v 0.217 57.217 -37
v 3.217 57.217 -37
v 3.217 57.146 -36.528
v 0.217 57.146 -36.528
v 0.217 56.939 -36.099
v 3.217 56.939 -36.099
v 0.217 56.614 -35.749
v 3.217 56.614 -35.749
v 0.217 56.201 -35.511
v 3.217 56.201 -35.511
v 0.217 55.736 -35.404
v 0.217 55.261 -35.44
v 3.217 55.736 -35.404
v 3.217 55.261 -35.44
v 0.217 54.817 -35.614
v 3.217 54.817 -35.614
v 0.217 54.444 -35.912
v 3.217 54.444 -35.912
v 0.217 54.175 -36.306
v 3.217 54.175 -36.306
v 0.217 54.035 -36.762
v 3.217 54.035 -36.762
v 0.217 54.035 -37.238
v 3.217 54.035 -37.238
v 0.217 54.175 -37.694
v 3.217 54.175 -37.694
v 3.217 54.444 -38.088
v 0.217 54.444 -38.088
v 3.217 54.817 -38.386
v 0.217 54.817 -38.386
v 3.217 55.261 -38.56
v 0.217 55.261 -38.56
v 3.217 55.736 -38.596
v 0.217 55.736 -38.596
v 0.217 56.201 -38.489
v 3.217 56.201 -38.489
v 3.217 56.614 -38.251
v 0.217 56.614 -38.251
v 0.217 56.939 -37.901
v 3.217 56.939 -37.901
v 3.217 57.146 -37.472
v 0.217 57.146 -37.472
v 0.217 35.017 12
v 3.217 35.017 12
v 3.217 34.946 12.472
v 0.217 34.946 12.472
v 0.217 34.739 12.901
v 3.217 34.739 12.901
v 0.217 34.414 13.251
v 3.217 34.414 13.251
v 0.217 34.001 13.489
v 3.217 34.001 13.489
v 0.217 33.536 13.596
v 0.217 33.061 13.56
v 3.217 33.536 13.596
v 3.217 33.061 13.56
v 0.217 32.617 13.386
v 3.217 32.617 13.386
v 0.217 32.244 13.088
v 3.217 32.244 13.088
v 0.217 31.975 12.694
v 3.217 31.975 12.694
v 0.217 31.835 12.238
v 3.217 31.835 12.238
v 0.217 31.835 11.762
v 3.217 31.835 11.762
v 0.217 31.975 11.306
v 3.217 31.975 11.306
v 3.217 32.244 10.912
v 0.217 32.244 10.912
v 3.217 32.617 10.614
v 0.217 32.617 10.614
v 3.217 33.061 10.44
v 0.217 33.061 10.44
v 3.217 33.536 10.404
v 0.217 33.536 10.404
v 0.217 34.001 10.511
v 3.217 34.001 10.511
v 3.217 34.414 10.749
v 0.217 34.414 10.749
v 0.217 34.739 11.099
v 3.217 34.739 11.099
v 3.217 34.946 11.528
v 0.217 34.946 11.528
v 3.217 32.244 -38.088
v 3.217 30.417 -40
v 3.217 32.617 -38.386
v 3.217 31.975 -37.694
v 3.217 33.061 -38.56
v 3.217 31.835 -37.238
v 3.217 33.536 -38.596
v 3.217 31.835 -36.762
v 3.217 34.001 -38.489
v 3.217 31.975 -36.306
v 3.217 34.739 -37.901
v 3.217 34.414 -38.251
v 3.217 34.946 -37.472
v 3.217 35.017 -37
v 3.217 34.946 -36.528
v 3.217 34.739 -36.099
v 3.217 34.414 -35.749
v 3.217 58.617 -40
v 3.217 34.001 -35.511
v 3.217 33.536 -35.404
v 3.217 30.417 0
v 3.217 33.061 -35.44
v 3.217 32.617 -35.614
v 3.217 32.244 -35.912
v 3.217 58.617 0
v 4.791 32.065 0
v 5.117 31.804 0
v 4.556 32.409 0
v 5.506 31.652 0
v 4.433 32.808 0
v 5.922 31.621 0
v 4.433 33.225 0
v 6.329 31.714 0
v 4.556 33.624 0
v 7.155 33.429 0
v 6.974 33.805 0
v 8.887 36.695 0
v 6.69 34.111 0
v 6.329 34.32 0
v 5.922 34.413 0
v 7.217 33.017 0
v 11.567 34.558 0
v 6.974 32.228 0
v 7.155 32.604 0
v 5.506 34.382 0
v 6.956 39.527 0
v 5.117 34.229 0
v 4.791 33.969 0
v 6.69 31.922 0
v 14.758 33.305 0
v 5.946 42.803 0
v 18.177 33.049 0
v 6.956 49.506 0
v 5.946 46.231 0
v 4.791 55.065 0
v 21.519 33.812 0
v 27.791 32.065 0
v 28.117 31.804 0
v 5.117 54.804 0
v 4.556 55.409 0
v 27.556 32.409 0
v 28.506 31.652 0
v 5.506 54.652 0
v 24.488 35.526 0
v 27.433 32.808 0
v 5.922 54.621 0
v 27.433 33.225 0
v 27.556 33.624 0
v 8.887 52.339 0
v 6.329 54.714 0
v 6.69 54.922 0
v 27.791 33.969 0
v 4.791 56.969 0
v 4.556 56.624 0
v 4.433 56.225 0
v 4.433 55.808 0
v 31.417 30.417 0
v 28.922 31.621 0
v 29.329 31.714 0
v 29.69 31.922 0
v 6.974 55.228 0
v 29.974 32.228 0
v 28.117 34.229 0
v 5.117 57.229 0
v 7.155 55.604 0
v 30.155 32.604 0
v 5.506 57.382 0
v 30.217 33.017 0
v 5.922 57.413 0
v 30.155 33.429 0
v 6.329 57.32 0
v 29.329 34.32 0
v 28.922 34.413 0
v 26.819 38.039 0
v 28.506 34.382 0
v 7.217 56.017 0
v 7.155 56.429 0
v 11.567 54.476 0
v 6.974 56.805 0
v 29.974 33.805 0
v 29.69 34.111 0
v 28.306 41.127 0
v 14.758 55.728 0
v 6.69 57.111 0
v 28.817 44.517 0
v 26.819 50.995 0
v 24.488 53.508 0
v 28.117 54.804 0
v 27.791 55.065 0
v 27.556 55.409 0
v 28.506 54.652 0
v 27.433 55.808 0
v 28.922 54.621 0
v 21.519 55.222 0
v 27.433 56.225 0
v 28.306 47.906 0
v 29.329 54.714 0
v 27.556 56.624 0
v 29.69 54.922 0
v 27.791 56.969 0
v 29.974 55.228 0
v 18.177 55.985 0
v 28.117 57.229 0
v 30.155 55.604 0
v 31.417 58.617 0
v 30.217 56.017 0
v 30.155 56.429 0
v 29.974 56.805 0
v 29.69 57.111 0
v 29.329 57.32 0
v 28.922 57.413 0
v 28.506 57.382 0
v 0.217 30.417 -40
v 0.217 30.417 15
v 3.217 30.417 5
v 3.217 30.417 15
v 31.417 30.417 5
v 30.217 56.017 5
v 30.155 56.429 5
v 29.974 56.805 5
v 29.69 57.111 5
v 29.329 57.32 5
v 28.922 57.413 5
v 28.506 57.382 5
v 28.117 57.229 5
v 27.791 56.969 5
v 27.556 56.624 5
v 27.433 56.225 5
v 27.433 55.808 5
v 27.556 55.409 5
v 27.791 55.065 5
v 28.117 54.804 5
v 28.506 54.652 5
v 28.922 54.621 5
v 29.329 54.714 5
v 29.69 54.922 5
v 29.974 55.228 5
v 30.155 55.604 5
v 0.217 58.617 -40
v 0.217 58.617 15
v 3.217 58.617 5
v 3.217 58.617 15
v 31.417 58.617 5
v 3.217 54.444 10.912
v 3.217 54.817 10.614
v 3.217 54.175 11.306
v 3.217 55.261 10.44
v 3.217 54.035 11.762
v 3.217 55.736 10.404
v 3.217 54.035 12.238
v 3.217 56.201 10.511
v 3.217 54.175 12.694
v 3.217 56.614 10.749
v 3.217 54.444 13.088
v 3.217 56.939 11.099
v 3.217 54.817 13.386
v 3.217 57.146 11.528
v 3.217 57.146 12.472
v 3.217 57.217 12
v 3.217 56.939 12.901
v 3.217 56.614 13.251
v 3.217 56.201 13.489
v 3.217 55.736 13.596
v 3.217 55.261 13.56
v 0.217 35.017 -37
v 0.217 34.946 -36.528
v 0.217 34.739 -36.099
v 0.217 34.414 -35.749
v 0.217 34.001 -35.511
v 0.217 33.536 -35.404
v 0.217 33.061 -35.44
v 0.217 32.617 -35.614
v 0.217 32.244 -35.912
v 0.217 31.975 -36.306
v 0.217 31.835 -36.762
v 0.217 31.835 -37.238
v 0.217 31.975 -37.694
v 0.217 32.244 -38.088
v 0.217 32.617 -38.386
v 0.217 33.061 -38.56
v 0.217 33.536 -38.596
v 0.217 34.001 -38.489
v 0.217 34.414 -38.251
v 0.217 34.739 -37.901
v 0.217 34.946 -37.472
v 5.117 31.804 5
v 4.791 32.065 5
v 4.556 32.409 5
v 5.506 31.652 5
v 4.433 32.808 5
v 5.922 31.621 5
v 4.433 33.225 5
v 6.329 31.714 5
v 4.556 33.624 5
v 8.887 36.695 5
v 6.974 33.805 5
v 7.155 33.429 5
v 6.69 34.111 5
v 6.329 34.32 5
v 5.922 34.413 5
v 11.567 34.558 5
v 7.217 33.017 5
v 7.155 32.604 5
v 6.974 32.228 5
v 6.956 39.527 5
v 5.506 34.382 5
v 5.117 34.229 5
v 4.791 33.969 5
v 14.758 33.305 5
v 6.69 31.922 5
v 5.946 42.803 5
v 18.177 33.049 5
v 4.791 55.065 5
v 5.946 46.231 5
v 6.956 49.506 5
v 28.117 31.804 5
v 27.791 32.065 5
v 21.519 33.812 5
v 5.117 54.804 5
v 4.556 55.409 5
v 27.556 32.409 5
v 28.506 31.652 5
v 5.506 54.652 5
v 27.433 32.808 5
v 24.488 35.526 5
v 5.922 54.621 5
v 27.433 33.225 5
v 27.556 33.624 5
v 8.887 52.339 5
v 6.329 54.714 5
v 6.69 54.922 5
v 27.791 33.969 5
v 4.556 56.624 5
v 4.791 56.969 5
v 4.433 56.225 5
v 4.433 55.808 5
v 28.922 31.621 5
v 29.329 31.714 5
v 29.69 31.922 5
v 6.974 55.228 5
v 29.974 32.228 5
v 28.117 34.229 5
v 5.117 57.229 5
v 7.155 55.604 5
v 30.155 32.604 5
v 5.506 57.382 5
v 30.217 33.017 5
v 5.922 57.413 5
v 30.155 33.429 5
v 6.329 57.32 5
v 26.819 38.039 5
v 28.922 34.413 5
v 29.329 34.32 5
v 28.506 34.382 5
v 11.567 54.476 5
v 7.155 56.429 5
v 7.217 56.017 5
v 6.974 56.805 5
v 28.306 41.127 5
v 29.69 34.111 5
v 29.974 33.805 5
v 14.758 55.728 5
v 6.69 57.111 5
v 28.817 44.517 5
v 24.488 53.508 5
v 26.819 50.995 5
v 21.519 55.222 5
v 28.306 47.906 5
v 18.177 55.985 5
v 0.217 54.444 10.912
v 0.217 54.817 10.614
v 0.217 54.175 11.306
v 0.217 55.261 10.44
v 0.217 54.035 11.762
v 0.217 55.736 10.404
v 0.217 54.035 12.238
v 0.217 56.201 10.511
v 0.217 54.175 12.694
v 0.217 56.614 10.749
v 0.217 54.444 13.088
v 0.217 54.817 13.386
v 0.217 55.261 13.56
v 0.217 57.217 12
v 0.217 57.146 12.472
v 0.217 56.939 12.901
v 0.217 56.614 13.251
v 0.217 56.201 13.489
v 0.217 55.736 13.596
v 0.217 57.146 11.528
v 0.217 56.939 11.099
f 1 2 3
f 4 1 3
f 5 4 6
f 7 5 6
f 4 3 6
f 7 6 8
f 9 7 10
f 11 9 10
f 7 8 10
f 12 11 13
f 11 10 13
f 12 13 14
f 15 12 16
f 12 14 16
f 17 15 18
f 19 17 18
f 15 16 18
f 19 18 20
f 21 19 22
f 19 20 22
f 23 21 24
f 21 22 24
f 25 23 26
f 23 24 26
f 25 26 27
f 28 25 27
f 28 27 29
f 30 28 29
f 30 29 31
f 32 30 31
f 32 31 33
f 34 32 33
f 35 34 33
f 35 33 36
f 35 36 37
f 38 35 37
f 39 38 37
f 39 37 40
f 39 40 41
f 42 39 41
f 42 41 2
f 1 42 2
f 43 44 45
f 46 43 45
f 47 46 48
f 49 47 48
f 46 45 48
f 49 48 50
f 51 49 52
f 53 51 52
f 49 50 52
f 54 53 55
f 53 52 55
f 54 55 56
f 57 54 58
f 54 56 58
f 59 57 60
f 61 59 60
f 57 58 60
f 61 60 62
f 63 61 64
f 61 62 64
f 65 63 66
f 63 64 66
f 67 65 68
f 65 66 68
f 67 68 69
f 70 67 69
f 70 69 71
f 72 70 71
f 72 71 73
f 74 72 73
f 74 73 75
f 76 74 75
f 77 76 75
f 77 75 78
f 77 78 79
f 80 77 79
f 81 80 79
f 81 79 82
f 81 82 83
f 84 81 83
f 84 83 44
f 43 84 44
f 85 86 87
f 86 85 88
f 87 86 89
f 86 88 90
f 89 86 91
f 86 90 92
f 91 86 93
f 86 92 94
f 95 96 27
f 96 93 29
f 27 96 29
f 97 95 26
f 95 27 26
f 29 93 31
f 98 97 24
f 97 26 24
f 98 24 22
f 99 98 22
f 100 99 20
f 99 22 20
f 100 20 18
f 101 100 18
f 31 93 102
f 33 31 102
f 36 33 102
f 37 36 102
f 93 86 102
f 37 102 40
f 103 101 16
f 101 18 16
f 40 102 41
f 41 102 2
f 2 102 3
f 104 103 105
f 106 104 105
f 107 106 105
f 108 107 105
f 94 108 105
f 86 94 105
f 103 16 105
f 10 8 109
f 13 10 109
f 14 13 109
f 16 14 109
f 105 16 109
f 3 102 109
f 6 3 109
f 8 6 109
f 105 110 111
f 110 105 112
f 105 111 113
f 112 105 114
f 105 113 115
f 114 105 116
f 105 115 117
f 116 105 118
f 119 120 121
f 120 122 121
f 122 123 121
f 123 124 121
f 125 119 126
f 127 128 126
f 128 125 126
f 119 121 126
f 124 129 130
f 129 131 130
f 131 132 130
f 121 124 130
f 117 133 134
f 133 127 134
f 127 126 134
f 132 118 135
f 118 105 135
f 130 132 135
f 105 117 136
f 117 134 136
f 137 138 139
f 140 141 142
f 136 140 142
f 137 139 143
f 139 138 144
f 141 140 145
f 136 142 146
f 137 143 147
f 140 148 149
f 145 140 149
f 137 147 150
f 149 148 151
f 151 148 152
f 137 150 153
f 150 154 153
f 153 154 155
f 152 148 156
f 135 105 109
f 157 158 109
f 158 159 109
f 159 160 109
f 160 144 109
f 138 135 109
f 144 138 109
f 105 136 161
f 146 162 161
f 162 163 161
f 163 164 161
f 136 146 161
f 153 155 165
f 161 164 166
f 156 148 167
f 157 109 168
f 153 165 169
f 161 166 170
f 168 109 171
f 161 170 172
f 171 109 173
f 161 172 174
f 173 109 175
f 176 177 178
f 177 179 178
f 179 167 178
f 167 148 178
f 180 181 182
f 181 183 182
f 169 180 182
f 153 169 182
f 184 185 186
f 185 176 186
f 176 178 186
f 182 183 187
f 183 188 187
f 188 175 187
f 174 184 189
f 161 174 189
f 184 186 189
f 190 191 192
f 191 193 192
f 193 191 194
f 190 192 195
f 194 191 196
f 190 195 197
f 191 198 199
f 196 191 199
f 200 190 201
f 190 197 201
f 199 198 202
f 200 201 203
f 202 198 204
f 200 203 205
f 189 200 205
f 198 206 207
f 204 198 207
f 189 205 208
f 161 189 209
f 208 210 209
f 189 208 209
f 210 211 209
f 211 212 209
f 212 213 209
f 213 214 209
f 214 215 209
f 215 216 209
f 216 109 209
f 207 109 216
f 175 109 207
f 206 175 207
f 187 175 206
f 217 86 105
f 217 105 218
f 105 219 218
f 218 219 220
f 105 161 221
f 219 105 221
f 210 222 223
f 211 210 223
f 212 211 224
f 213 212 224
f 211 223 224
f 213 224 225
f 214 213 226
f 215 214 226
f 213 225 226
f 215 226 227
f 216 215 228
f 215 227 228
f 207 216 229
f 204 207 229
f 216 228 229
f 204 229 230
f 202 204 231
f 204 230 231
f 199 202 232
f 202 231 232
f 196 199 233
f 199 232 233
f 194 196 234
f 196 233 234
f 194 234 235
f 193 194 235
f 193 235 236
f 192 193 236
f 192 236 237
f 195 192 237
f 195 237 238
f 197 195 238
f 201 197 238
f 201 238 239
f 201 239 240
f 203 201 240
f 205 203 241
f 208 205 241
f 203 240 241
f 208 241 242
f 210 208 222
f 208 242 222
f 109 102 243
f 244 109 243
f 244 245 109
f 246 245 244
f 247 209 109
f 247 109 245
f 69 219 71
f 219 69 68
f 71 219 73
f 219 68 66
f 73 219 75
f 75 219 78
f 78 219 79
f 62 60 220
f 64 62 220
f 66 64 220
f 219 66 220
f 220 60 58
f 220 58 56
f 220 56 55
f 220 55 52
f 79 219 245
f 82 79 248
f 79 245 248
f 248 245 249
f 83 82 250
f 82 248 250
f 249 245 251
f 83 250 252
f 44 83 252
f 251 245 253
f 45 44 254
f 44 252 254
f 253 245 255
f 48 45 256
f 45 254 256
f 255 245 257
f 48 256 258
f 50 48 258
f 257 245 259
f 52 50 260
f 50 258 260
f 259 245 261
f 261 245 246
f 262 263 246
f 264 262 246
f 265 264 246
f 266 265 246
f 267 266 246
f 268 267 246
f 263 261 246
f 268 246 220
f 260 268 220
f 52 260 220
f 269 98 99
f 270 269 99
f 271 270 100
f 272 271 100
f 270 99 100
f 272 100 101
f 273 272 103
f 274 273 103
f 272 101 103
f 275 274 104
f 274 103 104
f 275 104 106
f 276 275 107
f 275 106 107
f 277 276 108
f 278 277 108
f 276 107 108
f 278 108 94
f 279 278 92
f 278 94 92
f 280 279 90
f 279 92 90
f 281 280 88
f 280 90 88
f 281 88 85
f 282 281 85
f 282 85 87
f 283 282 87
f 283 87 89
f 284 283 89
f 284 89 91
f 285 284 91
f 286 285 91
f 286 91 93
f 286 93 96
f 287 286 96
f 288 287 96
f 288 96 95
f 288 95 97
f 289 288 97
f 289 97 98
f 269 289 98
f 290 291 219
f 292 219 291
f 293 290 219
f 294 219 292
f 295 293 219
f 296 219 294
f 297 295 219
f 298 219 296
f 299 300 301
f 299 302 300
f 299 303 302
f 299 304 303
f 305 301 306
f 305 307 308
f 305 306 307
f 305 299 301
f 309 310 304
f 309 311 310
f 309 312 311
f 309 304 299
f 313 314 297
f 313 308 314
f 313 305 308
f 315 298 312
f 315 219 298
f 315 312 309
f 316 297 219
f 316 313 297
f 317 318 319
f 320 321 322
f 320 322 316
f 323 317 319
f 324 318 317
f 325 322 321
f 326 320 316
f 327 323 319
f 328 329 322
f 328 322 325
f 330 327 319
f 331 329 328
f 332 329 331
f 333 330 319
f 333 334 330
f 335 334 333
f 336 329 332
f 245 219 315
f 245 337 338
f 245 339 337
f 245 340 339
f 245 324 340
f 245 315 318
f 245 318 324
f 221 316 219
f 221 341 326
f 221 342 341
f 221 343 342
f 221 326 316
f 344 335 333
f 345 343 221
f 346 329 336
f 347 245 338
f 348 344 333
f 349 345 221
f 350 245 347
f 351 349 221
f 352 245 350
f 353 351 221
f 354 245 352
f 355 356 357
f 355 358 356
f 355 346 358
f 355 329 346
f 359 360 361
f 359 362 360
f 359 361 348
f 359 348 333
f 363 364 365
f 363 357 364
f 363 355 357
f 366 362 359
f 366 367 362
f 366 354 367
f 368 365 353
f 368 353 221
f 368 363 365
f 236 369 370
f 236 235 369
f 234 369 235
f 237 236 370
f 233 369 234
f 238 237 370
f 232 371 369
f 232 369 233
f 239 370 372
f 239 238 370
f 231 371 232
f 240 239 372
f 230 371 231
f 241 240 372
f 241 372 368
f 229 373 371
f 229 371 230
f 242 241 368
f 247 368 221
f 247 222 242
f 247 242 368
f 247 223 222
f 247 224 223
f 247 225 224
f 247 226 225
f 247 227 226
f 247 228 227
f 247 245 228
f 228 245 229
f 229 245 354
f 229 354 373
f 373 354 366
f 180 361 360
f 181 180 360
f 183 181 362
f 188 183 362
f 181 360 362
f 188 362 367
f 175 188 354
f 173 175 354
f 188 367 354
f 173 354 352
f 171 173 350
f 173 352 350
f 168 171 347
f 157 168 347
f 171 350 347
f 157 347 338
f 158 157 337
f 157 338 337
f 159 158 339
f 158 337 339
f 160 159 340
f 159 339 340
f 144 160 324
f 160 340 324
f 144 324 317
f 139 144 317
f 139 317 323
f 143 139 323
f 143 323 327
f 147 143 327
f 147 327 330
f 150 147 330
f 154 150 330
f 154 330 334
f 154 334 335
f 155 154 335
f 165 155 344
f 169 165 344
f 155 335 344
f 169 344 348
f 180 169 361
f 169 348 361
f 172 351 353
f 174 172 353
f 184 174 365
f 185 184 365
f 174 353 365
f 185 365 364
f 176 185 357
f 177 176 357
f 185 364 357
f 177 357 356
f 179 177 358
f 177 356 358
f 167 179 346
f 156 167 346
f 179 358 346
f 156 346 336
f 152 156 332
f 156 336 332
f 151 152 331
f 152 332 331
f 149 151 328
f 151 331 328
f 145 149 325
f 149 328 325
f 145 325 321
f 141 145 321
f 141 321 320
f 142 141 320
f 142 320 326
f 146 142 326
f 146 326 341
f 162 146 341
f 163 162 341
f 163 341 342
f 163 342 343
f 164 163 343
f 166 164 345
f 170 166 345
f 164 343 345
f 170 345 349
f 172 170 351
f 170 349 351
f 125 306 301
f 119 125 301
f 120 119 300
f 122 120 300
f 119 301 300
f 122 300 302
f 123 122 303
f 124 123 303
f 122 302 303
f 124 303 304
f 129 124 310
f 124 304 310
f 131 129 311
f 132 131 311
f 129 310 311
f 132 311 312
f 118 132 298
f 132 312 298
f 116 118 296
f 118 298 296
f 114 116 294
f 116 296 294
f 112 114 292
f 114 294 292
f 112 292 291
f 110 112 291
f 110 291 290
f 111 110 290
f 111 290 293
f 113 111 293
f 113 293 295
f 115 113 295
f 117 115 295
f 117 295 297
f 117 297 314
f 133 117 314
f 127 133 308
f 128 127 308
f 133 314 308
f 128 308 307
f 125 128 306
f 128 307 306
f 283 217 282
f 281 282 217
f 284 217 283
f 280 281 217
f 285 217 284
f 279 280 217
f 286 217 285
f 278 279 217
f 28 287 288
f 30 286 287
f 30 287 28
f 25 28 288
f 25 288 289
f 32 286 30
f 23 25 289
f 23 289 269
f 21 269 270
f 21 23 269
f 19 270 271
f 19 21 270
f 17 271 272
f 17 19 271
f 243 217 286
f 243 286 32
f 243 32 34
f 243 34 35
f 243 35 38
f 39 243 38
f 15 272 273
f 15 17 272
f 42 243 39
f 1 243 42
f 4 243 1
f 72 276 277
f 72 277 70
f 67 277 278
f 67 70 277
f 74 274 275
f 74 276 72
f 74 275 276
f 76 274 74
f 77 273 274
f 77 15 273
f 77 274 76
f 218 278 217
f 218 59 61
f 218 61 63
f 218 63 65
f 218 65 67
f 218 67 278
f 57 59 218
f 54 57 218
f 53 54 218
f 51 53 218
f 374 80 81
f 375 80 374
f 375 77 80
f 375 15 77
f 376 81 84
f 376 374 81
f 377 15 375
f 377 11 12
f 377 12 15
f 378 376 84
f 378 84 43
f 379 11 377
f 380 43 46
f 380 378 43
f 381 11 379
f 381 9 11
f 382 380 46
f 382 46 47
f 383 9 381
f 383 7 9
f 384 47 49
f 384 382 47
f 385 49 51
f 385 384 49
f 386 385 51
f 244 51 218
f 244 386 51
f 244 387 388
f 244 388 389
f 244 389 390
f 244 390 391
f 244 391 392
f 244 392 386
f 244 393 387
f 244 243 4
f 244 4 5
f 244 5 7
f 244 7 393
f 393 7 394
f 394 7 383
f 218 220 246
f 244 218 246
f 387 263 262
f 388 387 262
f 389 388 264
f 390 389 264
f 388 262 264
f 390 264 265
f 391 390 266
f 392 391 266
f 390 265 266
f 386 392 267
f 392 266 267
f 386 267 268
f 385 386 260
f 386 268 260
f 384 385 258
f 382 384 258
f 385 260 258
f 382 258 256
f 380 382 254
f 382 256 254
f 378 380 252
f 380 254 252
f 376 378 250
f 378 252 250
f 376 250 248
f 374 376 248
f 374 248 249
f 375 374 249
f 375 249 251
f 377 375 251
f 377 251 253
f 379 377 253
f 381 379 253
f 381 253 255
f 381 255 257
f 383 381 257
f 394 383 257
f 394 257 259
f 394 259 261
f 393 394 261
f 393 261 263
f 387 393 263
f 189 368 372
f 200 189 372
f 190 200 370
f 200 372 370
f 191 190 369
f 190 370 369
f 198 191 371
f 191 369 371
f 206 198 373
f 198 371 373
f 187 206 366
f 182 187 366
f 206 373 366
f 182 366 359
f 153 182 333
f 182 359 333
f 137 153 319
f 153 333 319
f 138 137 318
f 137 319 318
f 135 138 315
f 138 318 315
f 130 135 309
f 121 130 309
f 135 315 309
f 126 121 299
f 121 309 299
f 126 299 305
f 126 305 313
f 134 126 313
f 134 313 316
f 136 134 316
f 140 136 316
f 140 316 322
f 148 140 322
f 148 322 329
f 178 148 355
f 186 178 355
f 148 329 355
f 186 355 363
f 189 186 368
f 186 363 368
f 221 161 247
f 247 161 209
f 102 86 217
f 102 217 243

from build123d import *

# Parameters (mm, degrees)
SKETCH2_W           = 28.2
SKETCH2_H           = 28.2
BOSS_EXTRUDE1_DEPTH = 5
SKETCH3_R           = 1.4
CUT_EXTRUDE1_DEPTH  = 5
SKETCH4_R           = 11.5
CUT_EXTRUDE2_DEPTH  = 5
SKETCH7_W           = 55
SKETCH7_H           = 28.2
BOSS_EXTRUDE2_DEPTH = 3
SKETCH10_R          = 1.6
CUT_EXTRUDE7_DEPTH  = 5


with BuildPart() as part:
    # Sketch2 → Boss-Extrude1 (new body)
    with BuildSketch(Plane.XY):
        with Locations((17.317401284, 44.516795377)):
            Rectangle(SKETCH2_W, SKETCH2_H)
    extrude(amount=BOSS_EXTRUDE1_DEPTH)

    # Sketch3 → Cut-Extrude1 (cut)
    with BuildSketch(Plane.XY.offset(5)):
        with Locations((5.817401284, 56.016795377)):
            Circle(SKETCH3_R)
        with Locations((28.817401284, 56.016795377)):
            Circle(SKETCH3_R)
        with Locations((28.817401284, 33.016795377)):
            Circle(SKETCH3_R)
        with Locations((5.817401284, 33.016795377)):
            Circle(SKETCH3_R)
    extrude(amount=-CUT_EXTRUDE1_DEPTH, mode=Mode.SUBTRACT)

    # Sketch4 → Cut-Extrude2 (cut)
    with BuildSketch(Plane.XY.offset(5)):
        with Locations((17.317401284, 44.516795377)):
            Circle(SKETCH4_R)
    extrude(amount=-CUT_EXTRUDE2_DEPTH, mode=Mode.SUBTRACT)

    # Sketch7 → Boss-Extrude2 (add)
    with BuildSketch(Plane.ZY.offset(-3.217401284)):
        with Locations((-12.5, 44.516795377)):
            Rectangle(SKETCH7_W, SKETCH7_H)
    extrude(amount=BOSS_EXTRUDE2_DEPTH)

    # Sketch10 → Cut-Extrude7 (cut)
    with BuildSketch(Plane(origin=(3.217401284, 0, 0), x_dir=(0, 0, -1), z_dir=(1, 0, 0))):
        with Locations(Location((37, 55.616795377, 0), (0, 0, 90))):
            Circle(SKETCH10_R)
        with Locations(Location((37, 33.416795377, 0), (0, 0, 90))):
            Circle(SKETCH10_R)
        with Locations(Location((-12, 55.616795377, 0), (0, 0, 90))):
            Circle(SKETCH10_R)
        with Locations(Location((-12, 33.416795377, 0), (0, 0, 90))):
            Circle(SKETCH10_R)
    extrude(amount=-CUT_EXTRUDE7_DEPTH, mode=Mode.SUBTRACT)


solid = part.part
